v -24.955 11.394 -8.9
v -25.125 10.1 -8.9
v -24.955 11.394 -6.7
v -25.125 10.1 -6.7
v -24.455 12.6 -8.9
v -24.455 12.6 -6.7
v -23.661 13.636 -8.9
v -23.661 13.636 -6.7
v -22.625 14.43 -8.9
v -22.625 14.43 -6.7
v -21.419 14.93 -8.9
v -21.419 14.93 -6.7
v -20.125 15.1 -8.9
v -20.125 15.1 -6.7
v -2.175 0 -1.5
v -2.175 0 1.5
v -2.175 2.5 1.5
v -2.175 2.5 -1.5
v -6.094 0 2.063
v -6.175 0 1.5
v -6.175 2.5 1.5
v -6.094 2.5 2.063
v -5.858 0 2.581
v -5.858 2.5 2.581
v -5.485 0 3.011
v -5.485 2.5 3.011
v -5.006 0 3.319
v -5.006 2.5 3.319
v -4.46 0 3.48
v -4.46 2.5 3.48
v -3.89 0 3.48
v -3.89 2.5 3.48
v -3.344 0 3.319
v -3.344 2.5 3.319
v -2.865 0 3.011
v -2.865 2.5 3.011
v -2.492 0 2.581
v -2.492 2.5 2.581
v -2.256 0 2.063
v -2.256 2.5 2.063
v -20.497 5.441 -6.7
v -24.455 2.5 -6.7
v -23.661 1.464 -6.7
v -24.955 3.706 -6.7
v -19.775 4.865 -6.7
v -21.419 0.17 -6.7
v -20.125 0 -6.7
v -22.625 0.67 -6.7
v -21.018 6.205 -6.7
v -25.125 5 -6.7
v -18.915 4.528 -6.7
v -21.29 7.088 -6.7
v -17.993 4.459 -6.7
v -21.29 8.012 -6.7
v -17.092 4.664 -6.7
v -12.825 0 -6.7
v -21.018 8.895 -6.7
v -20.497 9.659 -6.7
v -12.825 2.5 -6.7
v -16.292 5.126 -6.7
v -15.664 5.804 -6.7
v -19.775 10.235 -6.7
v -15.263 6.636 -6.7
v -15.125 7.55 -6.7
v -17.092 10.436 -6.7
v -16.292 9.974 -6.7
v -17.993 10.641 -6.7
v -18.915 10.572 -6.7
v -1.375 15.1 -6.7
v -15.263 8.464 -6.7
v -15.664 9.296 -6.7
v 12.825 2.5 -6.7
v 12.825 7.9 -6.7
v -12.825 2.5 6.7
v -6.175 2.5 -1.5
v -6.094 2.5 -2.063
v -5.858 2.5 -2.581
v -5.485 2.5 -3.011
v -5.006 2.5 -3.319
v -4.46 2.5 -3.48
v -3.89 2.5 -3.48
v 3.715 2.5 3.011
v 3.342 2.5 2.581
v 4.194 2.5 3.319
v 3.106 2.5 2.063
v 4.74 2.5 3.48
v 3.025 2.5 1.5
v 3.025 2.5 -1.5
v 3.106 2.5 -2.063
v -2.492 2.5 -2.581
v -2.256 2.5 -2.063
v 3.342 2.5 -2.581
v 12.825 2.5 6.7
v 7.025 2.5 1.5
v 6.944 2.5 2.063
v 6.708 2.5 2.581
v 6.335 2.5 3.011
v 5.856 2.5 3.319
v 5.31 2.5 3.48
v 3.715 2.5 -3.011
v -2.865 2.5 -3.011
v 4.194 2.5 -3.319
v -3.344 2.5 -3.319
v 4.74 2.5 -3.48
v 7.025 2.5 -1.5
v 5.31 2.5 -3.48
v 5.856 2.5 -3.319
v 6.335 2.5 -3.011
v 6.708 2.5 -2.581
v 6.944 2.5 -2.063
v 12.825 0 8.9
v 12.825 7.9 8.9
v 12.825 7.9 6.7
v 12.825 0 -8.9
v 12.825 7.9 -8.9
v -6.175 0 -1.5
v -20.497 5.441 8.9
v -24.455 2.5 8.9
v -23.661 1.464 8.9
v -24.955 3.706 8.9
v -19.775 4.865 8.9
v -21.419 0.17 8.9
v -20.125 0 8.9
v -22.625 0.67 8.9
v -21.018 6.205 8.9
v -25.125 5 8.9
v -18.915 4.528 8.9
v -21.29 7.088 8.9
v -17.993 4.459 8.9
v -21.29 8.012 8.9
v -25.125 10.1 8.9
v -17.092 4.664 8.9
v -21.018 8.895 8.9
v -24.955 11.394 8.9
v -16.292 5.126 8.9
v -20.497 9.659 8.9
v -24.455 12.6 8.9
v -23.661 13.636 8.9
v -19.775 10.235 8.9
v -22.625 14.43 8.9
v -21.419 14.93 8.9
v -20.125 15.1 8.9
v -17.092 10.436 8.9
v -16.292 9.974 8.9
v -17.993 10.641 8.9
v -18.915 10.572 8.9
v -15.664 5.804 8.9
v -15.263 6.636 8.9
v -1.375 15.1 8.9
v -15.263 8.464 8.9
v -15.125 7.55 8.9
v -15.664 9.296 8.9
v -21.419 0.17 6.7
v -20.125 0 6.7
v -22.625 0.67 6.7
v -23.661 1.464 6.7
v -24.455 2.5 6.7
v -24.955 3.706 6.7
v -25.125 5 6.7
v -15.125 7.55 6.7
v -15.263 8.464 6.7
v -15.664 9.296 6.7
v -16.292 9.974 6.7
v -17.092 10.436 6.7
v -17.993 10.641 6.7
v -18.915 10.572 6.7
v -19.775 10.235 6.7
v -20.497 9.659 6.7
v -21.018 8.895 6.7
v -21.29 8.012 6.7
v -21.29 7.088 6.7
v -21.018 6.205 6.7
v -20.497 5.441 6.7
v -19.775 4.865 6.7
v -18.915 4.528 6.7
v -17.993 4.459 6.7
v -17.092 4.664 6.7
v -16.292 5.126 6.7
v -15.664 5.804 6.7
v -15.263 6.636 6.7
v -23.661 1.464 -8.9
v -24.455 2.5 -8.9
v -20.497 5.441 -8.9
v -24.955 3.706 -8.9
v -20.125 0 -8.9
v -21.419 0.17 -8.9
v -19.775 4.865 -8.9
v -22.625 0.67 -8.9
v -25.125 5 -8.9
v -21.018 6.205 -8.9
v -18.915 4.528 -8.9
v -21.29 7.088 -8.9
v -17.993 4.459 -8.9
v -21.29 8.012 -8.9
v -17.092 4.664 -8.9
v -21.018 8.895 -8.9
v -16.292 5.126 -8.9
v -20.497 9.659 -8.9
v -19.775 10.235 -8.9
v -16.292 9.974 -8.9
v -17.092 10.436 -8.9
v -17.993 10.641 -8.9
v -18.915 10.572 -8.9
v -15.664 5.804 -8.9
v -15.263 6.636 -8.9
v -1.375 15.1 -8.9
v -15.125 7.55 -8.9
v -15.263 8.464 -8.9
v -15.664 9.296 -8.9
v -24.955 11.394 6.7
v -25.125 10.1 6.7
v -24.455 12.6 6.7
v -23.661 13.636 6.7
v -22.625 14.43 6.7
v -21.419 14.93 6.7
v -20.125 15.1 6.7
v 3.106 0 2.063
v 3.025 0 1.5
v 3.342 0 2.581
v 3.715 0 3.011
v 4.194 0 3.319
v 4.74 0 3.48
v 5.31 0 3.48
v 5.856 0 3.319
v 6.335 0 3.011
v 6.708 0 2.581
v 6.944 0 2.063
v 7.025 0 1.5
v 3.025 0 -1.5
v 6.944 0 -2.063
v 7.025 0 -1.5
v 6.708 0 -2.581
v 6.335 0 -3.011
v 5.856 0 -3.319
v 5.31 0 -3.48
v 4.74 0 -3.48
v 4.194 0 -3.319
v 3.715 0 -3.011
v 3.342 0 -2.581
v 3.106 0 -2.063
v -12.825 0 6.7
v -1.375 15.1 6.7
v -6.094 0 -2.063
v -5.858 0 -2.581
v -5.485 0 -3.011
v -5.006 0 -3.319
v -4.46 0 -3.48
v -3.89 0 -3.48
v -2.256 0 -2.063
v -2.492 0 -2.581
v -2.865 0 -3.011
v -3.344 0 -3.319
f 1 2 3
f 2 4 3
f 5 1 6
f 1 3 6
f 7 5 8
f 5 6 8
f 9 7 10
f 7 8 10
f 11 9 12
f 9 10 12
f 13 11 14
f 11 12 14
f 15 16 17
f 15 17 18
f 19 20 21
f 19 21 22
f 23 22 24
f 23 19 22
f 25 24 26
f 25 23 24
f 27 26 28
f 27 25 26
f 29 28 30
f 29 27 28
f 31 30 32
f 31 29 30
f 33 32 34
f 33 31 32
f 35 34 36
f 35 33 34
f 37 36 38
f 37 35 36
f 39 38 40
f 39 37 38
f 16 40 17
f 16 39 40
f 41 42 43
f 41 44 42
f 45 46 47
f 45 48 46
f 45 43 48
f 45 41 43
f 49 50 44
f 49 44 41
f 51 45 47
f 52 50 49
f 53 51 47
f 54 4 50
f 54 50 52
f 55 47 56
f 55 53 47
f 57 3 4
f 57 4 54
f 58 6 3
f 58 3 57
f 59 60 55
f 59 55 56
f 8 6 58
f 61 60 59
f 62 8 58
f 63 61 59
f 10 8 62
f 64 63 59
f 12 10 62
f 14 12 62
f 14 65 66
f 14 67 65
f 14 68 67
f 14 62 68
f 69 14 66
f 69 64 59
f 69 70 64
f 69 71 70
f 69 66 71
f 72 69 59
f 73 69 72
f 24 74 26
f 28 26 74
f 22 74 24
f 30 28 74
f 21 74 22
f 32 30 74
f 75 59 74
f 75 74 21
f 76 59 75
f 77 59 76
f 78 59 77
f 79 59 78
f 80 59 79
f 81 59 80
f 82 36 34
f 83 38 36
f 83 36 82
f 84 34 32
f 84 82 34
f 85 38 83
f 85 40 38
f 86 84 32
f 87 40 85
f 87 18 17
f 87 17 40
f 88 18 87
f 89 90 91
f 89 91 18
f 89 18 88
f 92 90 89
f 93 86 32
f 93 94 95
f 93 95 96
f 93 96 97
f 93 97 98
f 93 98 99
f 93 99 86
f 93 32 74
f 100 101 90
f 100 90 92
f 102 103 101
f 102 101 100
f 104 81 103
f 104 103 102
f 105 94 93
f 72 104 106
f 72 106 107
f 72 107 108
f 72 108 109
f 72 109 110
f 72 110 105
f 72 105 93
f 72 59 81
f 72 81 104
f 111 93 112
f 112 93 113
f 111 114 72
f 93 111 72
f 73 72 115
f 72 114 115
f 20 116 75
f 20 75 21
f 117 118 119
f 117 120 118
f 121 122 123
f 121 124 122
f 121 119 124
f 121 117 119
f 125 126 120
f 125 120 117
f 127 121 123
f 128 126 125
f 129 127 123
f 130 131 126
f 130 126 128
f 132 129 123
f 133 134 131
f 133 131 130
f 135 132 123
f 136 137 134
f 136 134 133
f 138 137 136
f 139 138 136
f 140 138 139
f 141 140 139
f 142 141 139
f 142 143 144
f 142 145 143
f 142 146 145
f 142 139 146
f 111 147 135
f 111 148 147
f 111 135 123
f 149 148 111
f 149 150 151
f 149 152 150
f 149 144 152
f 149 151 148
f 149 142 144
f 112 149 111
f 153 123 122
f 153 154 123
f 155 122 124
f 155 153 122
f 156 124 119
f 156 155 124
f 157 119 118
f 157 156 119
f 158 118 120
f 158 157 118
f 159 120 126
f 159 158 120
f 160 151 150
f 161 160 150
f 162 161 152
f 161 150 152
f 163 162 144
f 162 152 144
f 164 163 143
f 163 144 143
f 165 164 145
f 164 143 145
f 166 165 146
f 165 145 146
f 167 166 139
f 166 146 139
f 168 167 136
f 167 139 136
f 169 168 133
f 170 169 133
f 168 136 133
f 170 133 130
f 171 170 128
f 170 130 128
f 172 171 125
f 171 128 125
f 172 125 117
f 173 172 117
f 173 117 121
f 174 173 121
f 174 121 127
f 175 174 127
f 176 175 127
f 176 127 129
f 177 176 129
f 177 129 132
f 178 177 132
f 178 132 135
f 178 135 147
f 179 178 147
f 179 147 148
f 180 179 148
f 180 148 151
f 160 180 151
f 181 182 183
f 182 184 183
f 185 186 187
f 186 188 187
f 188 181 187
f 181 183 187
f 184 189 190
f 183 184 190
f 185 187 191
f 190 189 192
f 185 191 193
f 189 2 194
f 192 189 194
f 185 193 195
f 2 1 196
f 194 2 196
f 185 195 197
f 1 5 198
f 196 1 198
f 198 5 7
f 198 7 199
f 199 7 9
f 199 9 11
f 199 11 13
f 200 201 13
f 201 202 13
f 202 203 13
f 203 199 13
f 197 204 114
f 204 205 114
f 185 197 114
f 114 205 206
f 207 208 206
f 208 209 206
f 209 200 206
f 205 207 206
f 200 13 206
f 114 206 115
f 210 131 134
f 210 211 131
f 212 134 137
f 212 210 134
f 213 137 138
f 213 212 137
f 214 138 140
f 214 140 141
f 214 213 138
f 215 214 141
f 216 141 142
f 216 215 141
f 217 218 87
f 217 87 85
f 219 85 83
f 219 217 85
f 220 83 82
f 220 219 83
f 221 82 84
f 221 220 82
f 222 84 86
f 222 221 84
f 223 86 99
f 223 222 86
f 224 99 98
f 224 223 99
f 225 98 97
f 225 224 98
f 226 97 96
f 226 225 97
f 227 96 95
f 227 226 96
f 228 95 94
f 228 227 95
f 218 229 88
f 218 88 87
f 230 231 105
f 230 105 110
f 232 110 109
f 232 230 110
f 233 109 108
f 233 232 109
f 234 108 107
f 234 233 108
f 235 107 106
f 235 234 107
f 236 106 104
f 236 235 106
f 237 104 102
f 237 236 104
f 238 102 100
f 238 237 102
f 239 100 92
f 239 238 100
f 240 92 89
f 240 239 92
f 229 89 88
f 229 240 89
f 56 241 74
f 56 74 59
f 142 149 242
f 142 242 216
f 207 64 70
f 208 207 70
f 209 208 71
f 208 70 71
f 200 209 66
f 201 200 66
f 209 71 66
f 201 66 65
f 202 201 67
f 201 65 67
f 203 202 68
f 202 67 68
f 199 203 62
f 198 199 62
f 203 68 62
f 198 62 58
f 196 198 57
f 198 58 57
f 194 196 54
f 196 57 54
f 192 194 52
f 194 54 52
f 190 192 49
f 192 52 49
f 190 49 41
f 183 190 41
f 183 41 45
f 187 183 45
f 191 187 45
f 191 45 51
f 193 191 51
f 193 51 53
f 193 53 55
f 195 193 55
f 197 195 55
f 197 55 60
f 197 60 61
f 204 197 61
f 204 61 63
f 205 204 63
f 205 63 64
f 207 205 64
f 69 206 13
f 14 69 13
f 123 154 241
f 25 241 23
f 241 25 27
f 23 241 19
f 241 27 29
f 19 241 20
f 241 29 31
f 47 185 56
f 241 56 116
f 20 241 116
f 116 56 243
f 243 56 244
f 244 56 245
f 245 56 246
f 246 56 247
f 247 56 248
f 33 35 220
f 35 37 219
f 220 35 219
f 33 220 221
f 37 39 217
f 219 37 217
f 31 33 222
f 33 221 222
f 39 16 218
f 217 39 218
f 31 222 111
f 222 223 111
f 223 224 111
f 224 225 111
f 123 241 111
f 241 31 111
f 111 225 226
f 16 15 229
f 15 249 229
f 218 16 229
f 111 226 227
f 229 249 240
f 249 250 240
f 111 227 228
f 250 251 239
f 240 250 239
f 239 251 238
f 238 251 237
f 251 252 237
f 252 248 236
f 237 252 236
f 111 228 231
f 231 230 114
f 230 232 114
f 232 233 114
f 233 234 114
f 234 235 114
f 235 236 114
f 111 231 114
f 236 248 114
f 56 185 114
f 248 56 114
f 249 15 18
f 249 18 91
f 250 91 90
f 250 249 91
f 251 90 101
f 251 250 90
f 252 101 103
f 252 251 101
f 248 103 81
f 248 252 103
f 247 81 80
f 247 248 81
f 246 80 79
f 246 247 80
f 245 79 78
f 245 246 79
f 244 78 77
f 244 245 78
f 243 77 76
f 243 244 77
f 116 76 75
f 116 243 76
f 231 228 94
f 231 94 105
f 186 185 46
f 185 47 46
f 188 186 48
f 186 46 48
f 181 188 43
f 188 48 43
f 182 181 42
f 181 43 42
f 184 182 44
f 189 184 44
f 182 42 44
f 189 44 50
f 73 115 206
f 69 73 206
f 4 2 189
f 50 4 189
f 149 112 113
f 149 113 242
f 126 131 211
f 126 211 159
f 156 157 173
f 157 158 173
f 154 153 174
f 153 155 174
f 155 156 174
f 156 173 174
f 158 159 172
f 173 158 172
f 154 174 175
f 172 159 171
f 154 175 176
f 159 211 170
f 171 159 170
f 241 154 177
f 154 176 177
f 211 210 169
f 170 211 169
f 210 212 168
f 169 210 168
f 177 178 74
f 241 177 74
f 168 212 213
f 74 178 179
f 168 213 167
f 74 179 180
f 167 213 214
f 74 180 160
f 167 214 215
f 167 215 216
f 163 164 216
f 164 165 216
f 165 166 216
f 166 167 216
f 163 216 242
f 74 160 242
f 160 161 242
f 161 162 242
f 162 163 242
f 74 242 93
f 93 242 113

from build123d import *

# Parameters (mm, degrees)
CROQUIS1_W              = 25.65
CROQUIS1_H              = 17.8
SALIENTE_EXTRUIR1_DEPTH = 2.5
SALIENTE_EXTRUIR2_DEPTH = 2.2
CROQUIS3_R              = 3.1
CORTAR_EXTRUIR1_DEPTH   = 18.8
CORTAR_EXTRUIR2_DEPTH   = 16.1
REDONDEO1_R             = 5


with BuildPart() as part:
    # Croquis1 → Saliente-Extruir1 (new body)
    with BuildSketch(Plane(origin=(0, 0, 0), x_dir=(1, 0, 0), z_dir=(0, 1, 0))):
        Rectangle(CROQUIS1_W, CROQUIS1_H)
    extrude(amount=SALIENTE_EXTRUIR1_DEPTH)

    # Croquis2 → Saliente-Extruir2 (add)
    with BuildSketch(Plane.XY.offset(8.9)):
        Polygon((-25.125, 0), (12.825, 0), (12.825, 7.9), (-1.375, 15.1), (-25.125, 15.1), align=None)
    saliente_extruir2 = extrude(amount=-SALIENTE_EXTRUIR2_DEPTH)

    # Simetría1: Saliente-Extruir2 across plane
    add(saliente_extruir2.mirror(Plane.XY))

    # Croquis3 → Cortar-Extruir1 (cut, through all)
    with BuildSketch(Plane.XY.offset(8.9)):
        with Locations((-18.225, 7.55)):
            Circle(CROQUIS3_R)
    extrude(amount=-CORTAR_EXTRUIR1_DEPTH, mode=Mode.SUBTRACT)

    # Croquis4 → Cortar-Extruir2 (cut, through all)
    with BuildSketch(Plane.XZ):
        with BuildLine():
            Line((-2.175, 1.5), (-2.175, -1.5))
            ThreePointArc((-2.175, -1.5), (-4.175, -3.5), (-6.175, -1.5))
            Line((-6.175, -1.5), (-6.175, 1.5))
            ThreePointArc((-6.175, 1.5), (-4.175, 3.5), (-2.175, 1.5))
        make_face()
        with BuildLine():
            Line((3.025, -1.5), (3.025, 1.5))
            ThreePointArc((3.025, 1.5), (5.025, 3.5), (7.025, 1.5))
            Line((7.025, 1.5), (7.025, -1.5))
            ThreePointArc((7.025, -1.5), (5.025, -3.5), (3.025, -1.5))
        make_face()
    extrude(amount=-CORTAR_EXTRUIR2_DEPTH, mode=Mode.SUBTRACT)

    # Redondeo1
    redondeo1_edges = [part.edges().sort_by_distance(p)[0] for p in [
        (-25.125, 0, 7.8),
        (-25.125, 15.1, 7.8),
        (-25.125, 0, -7.8),
        (-25.125, 15.1, -7.8),
    ]]
    fillet(redondeo1_edges, radius=REDONDEO1_R)


solid = part.part
